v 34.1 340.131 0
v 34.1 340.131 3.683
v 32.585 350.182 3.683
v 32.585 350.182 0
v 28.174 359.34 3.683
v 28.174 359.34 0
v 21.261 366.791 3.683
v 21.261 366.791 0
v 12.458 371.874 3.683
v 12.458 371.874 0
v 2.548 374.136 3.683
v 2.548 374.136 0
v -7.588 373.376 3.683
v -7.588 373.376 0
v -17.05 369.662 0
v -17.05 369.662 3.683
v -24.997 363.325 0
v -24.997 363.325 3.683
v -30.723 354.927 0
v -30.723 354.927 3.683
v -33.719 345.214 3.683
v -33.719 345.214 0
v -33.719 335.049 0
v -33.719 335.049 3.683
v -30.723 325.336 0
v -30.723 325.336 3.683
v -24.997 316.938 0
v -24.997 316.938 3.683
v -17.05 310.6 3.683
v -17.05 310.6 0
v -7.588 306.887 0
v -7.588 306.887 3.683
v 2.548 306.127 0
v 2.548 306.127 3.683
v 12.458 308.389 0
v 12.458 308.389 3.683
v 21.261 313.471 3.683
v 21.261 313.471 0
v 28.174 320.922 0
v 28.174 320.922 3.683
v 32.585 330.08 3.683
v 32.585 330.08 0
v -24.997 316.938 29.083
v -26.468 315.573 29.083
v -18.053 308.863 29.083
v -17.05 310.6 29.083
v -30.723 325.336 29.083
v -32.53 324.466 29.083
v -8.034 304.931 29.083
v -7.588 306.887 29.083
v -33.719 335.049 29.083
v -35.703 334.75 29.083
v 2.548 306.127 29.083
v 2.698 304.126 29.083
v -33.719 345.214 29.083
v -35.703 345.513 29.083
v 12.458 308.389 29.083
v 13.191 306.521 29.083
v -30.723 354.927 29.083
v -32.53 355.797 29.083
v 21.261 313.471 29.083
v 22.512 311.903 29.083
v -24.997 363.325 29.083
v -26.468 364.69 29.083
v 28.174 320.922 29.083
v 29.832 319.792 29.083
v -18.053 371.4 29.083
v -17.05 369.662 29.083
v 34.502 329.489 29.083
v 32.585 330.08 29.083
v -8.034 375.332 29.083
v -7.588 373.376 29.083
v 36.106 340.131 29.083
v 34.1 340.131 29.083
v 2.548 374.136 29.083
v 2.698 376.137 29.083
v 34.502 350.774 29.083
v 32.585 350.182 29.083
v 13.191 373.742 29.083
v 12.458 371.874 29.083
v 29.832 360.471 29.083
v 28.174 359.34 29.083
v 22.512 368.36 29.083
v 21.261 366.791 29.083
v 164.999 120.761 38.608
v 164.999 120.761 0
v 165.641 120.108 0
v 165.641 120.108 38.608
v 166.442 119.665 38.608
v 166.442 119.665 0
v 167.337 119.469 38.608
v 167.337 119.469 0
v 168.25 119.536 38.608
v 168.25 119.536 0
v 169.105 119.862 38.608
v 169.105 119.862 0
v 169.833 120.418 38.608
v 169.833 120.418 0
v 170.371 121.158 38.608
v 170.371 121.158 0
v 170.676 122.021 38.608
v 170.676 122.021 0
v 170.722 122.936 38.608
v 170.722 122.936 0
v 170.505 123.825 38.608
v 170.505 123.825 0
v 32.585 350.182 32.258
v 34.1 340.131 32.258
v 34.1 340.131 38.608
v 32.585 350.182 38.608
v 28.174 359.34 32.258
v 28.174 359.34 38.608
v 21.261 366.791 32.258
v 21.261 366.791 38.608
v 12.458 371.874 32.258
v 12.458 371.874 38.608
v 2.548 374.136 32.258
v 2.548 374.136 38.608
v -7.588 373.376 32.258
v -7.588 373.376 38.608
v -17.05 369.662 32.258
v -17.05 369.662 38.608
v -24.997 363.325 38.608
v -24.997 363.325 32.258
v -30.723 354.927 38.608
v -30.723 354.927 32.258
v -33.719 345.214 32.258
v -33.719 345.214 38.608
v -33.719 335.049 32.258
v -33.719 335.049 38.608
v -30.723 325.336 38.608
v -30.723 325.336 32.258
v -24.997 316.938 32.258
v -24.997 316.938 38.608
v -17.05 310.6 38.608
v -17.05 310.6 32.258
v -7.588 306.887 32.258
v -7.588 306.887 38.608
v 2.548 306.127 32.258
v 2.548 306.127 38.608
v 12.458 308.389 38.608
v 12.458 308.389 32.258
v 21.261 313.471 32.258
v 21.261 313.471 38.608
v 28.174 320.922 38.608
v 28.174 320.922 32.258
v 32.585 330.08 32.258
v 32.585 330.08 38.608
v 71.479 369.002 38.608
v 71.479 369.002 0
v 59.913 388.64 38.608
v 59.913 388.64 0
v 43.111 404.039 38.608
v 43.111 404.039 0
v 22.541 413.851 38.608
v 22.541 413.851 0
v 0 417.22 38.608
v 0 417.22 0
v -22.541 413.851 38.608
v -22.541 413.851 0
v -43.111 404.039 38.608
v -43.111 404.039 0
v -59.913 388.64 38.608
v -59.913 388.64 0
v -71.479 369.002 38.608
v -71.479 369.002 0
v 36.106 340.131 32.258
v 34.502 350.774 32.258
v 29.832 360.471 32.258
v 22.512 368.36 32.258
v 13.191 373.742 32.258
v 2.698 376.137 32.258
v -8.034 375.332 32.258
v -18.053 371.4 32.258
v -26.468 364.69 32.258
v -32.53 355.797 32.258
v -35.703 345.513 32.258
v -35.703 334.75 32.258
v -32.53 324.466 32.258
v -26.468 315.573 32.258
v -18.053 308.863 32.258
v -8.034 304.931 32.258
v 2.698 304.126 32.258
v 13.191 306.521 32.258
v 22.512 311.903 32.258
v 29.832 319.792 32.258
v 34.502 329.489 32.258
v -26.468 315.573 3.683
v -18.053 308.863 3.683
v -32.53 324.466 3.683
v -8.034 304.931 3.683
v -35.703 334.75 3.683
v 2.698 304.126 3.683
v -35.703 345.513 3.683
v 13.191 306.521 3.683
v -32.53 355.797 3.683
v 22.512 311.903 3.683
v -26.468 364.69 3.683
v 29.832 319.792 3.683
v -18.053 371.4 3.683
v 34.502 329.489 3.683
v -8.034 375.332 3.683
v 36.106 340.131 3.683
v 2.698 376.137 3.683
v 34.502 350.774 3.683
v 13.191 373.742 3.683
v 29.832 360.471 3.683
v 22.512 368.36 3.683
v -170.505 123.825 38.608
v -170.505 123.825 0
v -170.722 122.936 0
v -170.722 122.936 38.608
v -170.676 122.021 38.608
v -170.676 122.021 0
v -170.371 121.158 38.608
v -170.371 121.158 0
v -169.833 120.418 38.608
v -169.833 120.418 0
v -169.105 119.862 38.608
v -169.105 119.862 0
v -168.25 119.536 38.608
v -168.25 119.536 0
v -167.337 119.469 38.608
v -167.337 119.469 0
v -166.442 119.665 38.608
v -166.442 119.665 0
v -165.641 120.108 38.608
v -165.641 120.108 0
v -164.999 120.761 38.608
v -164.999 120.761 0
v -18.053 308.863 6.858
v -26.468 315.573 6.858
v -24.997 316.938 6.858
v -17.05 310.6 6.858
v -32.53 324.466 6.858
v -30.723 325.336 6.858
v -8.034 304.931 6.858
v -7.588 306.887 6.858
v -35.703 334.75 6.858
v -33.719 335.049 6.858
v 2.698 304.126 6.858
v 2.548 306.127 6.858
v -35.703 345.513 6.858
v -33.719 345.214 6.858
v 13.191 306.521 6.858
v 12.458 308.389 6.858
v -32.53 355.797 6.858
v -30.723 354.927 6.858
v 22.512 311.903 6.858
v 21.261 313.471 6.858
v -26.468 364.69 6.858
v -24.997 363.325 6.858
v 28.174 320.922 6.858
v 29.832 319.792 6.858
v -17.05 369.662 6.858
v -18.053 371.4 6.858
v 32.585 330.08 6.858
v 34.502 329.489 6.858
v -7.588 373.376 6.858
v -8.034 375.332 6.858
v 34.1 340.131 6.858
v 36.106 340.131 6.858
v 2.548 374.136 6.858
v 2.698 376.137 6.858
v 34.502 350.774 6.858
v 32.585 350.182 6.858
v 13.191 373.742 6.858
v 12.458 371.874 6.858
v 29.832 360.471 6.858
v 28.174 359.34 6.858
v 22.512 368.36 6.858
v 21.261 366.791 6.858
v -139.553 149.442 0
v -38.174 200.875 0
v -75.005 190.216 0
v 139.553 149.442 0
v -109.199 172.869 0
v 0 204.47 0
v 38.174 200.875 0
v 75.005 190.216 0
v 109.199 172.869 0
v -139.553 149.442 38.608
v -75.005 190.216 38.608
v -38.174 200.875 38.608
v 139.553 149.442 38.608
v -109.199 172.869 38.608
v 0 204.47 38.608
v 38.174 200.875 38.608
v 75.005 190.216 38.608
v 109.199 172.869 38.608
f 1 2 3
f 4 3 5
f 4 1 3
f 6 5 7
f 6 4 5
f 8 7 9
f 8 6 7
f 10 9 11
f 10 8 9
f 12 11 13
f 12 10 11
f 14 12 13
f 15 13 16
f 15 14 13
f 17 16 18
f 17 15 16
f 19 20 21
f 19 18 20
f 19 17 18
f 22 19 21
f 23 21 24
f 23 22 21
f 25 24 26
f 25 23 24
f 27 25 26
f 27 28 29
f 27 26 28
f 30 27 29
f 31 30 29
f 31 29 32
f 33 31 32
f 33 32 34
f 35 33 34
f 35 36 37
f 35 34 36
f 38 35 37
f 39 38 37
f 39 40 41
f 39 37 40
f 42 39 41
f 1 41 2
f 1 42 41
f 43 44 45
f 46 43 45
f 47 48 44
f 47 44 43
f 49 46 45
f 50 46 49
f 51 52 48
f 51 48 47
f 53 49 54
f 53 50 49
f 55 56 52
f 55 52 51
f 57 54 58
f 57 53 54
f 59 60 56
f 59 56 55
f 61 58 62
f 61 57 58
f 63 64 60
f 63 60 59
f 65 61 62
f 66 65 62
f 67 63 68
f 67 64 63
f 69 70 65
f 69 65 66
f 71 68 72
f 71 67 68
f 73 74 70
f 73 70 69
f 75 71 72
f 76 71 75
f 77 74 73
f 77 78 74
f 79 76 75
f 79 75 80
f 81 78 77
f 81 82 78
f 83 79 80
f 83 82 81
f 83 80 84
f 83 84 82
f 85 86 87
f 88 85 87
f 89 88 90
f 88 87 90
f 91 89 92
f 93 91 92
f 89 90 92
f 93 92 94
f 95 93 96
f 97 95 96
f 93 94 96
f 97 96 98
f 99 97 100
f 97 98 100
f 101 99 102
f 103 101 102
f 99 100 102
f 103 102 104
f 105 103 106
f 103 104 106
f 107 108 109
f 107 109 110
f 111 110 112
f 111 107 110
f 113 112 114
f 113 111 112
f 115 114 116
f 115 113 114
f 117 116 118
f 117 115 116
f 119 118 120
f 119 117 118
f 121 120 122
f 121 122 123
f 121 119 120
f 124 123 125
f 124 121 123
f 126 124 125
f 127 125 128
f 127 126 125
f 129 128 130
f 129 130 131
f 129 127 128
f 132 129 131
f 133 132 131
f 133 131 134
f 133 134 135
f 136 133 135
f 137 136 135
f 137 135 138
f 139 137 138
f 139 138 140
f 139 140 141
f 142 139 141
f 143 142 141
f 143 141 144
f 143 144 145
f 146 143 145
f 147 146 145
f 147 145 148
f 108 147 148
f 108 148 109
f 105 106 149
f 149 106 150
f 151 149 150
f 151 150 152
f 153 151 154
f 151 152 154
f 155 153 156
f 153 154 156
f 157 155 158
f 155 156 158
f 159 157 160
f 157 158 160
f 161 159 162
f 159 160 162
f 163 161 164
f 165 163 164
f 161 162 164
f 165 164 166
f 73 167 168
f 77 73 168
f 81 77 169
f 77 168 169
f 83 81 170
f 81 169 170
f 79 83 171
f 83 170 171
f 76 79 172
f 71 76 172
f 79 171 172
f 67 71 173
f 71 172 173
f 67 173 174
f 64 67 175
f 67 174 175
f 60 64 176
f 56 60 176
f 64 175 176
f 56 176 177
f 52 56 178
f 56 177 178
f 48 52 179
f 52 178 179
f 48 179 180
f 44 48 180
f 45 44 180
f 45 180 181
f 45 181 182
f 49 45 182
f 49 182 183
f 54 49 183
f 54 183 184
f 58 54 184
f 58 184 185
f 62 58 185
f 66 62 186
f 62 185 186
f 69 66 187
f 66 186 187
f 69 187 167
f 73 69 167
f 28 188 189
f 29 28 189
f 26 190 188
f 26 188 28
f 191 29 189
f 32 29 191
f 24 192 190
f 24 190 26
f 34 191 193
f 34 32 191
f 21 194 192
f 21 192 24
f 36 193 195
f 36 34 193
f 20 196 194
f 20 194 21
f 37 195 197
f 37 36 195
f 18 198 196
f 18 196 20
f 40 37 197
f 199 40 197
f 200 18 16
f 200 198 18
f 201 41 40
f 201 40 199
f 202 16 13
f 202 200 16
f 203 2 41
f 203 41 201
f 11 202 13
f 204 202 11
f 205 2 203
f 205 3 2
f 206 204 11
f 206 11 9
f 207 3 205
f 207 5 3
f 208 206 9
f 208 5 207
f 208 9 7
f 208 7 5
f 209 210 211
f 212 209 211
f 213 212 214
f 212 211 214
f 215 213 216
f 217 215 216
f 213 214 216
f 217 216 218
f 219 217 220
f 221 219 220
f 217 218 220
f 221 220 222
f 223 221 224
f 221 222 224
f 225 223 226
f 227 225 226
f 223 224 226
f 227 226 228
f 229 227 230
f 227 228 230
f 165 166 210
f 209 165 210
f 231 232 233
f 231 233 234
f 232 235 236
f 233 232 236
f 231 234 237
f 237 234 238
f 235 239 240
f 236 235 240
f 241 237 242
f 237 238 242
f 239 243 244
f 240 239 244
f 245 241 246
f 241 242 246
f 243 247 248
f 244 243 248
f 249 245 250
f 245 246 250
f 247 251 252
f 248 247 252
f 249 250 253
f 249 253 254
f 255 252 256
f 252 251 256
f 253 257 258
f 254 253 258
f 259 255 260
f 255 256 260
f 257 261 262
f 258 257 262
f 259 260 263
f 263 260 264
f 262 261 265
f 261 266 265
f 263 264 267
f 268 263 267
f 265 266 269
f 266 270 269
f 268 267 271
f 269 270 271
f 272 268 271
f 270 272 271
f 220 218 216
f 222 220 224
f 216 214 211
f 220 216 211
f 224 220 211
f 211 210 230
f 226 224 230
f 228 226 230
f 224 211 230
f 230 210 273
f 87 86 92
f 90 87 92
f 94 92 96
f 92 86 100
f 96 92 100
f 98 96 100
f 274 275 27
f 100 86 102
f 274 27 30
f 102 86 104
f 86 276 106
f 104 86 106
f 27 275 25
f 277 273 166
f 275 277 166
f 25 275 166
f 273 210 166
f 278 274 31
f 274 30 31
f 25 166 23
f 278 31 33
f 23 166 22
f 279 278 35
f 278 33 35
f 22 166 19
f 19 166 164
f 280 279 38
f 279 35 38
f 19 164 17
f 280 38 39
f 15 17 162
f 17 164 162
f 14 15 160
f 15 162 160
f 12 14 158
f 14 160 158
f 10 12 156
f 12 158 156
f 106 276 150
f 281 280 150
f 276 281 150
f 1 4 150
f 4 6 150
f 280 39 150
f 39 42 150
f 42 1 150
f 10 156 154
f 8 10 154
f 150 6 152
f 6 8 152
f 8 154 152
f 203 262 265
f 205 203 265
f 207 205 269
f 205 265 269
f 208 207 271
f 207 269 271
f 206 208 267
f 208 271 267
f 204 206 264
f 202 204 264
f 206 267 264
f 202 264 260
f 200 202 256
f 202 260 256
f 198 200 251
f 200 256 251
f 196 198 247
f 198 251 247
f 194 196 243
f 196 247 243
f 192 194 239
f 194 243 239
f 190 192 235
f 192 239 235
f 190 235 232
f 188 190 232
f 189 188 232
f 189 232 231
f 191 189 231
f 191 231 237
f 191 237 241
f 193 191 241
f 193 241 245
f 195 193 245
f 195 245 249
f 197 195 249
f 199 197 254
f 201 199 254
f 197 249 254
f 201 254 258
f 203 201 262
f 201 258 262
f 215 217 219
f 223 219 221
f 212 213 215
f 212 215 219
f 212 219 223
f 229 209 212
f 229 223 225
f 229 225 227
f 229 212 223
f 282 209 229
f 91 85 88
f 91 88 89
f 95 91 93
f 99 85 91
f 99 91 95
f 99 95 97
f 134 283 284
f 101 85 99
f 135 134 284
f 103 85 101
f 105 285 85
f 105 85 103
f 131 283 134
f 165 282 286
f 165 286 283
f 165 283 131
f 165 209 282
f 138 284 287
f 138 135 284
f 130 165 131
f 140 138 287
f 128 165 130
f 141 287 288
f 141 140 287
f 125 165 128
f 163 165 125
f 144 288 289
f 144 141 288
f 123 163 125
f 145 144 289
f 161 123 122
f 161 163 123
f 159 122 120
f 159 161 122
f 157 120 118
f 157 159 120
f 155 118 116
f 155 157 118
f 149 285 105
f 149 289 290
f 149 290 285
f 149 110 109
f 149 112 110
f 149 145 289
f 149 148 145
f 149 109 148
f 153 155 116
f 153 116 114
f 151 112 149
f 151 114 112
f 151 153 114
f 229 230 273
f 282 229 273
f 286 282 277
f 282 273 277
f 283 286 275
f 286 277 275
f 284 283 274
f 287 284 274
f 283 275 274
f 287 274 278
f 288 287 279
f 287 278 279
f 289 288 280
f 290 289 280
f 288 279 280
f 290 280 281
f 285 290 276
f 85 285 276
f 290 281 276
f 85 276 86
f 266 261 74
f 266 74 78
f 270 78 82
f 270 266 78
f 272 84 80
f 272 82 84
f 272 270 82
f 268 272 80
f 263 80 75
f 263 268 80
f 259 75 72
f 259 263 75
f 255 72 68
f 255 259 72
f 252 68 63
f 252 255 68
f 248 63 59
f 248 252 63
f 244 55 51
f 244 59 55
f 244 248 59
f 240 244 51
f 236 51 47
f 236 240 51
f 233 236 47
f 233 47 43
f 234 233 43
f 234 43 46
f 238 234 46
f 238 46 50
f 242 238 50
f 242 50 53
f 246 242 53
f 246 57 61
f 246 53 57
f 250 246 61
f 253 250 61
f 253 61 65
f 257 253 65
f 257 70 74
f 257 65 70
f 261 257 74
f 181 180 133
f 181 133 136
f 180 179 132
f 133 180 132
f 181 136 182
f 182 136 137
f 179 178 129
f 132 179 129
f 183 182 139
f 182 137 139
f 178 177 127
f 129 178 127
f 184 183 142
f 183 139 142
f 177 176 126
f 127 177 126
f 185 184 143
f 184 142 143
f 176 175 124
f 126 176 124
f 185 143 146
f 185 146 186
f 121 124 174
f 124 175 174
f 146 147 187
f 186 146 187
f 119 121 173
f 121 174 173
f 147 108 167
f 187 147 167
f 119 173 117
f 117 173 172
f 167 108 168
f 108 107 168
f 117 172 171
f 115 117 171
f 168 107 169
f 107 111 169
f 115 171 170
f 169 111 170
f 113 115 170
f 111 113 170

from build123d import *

# Parameters (mm, degrees)
F0_R     = 34.0995
F1_DEPTH = 38.608
F3_R     = 36.1061
F4_DEPTH = 3.175
F6_R     = 36.1061
F7_DEPTH = 3.175


with BuildPart() as f1:
    # F0 (on Top) → F1 (new body)
    with BuildSketch(Plane.XY):
        with BuildLine():
            ThreePointArc((-164.9993838278, 120.7608555636), (0, 204.47), (164.9993838278, 120.7608555636))
            ThreePointArc((164.9993838278, 120.7608555636), (169.1054469037, 119.8617116159), (170.5054247616, 123.8250783438))
            Line((170.5054247616, 123.8250783438), (71.4788316492, 369.0016363528))
            ThreePointArc((71.4788316492, 369.0016363528), (0, 417.2204), (-71.4788316492, 369.0016363528))
            Line((-71.4788316492, 369.0016363528), (-170.5054247616, 123.8250783438))
            ThreePointArc((-170.5054247616, 123.8250783438), (-169.1054469037, 119.8617116159), (-164.9993838278, 120.7608555636))
        make_face()
        with Locations((0, 340.1314)):
            Circle(F0_R, mode=Mode.SUBTRACT)
    extrude(amount=F1_DEPTH)

    # F3 (on offset) → F4 (cut)
    with BuildSketch(Plane.XY.offset(32.258)):
        with Locations((0, 340.1314)):
            Circle(F3_R)
    extrude(amount=-F4_DEPTH, mode=Mode.SUBTRACT)

    # F6 (on offset) → F7 (cut)
    with BuildSketch(Plane.XY.offset(6.858)):
        with Locations((0, 340.1314)):
            Circle(F6_R)
    extrude(amount=-F7_DEPTH, mode=Mode.SUBTRACT)


solid = f1.part
